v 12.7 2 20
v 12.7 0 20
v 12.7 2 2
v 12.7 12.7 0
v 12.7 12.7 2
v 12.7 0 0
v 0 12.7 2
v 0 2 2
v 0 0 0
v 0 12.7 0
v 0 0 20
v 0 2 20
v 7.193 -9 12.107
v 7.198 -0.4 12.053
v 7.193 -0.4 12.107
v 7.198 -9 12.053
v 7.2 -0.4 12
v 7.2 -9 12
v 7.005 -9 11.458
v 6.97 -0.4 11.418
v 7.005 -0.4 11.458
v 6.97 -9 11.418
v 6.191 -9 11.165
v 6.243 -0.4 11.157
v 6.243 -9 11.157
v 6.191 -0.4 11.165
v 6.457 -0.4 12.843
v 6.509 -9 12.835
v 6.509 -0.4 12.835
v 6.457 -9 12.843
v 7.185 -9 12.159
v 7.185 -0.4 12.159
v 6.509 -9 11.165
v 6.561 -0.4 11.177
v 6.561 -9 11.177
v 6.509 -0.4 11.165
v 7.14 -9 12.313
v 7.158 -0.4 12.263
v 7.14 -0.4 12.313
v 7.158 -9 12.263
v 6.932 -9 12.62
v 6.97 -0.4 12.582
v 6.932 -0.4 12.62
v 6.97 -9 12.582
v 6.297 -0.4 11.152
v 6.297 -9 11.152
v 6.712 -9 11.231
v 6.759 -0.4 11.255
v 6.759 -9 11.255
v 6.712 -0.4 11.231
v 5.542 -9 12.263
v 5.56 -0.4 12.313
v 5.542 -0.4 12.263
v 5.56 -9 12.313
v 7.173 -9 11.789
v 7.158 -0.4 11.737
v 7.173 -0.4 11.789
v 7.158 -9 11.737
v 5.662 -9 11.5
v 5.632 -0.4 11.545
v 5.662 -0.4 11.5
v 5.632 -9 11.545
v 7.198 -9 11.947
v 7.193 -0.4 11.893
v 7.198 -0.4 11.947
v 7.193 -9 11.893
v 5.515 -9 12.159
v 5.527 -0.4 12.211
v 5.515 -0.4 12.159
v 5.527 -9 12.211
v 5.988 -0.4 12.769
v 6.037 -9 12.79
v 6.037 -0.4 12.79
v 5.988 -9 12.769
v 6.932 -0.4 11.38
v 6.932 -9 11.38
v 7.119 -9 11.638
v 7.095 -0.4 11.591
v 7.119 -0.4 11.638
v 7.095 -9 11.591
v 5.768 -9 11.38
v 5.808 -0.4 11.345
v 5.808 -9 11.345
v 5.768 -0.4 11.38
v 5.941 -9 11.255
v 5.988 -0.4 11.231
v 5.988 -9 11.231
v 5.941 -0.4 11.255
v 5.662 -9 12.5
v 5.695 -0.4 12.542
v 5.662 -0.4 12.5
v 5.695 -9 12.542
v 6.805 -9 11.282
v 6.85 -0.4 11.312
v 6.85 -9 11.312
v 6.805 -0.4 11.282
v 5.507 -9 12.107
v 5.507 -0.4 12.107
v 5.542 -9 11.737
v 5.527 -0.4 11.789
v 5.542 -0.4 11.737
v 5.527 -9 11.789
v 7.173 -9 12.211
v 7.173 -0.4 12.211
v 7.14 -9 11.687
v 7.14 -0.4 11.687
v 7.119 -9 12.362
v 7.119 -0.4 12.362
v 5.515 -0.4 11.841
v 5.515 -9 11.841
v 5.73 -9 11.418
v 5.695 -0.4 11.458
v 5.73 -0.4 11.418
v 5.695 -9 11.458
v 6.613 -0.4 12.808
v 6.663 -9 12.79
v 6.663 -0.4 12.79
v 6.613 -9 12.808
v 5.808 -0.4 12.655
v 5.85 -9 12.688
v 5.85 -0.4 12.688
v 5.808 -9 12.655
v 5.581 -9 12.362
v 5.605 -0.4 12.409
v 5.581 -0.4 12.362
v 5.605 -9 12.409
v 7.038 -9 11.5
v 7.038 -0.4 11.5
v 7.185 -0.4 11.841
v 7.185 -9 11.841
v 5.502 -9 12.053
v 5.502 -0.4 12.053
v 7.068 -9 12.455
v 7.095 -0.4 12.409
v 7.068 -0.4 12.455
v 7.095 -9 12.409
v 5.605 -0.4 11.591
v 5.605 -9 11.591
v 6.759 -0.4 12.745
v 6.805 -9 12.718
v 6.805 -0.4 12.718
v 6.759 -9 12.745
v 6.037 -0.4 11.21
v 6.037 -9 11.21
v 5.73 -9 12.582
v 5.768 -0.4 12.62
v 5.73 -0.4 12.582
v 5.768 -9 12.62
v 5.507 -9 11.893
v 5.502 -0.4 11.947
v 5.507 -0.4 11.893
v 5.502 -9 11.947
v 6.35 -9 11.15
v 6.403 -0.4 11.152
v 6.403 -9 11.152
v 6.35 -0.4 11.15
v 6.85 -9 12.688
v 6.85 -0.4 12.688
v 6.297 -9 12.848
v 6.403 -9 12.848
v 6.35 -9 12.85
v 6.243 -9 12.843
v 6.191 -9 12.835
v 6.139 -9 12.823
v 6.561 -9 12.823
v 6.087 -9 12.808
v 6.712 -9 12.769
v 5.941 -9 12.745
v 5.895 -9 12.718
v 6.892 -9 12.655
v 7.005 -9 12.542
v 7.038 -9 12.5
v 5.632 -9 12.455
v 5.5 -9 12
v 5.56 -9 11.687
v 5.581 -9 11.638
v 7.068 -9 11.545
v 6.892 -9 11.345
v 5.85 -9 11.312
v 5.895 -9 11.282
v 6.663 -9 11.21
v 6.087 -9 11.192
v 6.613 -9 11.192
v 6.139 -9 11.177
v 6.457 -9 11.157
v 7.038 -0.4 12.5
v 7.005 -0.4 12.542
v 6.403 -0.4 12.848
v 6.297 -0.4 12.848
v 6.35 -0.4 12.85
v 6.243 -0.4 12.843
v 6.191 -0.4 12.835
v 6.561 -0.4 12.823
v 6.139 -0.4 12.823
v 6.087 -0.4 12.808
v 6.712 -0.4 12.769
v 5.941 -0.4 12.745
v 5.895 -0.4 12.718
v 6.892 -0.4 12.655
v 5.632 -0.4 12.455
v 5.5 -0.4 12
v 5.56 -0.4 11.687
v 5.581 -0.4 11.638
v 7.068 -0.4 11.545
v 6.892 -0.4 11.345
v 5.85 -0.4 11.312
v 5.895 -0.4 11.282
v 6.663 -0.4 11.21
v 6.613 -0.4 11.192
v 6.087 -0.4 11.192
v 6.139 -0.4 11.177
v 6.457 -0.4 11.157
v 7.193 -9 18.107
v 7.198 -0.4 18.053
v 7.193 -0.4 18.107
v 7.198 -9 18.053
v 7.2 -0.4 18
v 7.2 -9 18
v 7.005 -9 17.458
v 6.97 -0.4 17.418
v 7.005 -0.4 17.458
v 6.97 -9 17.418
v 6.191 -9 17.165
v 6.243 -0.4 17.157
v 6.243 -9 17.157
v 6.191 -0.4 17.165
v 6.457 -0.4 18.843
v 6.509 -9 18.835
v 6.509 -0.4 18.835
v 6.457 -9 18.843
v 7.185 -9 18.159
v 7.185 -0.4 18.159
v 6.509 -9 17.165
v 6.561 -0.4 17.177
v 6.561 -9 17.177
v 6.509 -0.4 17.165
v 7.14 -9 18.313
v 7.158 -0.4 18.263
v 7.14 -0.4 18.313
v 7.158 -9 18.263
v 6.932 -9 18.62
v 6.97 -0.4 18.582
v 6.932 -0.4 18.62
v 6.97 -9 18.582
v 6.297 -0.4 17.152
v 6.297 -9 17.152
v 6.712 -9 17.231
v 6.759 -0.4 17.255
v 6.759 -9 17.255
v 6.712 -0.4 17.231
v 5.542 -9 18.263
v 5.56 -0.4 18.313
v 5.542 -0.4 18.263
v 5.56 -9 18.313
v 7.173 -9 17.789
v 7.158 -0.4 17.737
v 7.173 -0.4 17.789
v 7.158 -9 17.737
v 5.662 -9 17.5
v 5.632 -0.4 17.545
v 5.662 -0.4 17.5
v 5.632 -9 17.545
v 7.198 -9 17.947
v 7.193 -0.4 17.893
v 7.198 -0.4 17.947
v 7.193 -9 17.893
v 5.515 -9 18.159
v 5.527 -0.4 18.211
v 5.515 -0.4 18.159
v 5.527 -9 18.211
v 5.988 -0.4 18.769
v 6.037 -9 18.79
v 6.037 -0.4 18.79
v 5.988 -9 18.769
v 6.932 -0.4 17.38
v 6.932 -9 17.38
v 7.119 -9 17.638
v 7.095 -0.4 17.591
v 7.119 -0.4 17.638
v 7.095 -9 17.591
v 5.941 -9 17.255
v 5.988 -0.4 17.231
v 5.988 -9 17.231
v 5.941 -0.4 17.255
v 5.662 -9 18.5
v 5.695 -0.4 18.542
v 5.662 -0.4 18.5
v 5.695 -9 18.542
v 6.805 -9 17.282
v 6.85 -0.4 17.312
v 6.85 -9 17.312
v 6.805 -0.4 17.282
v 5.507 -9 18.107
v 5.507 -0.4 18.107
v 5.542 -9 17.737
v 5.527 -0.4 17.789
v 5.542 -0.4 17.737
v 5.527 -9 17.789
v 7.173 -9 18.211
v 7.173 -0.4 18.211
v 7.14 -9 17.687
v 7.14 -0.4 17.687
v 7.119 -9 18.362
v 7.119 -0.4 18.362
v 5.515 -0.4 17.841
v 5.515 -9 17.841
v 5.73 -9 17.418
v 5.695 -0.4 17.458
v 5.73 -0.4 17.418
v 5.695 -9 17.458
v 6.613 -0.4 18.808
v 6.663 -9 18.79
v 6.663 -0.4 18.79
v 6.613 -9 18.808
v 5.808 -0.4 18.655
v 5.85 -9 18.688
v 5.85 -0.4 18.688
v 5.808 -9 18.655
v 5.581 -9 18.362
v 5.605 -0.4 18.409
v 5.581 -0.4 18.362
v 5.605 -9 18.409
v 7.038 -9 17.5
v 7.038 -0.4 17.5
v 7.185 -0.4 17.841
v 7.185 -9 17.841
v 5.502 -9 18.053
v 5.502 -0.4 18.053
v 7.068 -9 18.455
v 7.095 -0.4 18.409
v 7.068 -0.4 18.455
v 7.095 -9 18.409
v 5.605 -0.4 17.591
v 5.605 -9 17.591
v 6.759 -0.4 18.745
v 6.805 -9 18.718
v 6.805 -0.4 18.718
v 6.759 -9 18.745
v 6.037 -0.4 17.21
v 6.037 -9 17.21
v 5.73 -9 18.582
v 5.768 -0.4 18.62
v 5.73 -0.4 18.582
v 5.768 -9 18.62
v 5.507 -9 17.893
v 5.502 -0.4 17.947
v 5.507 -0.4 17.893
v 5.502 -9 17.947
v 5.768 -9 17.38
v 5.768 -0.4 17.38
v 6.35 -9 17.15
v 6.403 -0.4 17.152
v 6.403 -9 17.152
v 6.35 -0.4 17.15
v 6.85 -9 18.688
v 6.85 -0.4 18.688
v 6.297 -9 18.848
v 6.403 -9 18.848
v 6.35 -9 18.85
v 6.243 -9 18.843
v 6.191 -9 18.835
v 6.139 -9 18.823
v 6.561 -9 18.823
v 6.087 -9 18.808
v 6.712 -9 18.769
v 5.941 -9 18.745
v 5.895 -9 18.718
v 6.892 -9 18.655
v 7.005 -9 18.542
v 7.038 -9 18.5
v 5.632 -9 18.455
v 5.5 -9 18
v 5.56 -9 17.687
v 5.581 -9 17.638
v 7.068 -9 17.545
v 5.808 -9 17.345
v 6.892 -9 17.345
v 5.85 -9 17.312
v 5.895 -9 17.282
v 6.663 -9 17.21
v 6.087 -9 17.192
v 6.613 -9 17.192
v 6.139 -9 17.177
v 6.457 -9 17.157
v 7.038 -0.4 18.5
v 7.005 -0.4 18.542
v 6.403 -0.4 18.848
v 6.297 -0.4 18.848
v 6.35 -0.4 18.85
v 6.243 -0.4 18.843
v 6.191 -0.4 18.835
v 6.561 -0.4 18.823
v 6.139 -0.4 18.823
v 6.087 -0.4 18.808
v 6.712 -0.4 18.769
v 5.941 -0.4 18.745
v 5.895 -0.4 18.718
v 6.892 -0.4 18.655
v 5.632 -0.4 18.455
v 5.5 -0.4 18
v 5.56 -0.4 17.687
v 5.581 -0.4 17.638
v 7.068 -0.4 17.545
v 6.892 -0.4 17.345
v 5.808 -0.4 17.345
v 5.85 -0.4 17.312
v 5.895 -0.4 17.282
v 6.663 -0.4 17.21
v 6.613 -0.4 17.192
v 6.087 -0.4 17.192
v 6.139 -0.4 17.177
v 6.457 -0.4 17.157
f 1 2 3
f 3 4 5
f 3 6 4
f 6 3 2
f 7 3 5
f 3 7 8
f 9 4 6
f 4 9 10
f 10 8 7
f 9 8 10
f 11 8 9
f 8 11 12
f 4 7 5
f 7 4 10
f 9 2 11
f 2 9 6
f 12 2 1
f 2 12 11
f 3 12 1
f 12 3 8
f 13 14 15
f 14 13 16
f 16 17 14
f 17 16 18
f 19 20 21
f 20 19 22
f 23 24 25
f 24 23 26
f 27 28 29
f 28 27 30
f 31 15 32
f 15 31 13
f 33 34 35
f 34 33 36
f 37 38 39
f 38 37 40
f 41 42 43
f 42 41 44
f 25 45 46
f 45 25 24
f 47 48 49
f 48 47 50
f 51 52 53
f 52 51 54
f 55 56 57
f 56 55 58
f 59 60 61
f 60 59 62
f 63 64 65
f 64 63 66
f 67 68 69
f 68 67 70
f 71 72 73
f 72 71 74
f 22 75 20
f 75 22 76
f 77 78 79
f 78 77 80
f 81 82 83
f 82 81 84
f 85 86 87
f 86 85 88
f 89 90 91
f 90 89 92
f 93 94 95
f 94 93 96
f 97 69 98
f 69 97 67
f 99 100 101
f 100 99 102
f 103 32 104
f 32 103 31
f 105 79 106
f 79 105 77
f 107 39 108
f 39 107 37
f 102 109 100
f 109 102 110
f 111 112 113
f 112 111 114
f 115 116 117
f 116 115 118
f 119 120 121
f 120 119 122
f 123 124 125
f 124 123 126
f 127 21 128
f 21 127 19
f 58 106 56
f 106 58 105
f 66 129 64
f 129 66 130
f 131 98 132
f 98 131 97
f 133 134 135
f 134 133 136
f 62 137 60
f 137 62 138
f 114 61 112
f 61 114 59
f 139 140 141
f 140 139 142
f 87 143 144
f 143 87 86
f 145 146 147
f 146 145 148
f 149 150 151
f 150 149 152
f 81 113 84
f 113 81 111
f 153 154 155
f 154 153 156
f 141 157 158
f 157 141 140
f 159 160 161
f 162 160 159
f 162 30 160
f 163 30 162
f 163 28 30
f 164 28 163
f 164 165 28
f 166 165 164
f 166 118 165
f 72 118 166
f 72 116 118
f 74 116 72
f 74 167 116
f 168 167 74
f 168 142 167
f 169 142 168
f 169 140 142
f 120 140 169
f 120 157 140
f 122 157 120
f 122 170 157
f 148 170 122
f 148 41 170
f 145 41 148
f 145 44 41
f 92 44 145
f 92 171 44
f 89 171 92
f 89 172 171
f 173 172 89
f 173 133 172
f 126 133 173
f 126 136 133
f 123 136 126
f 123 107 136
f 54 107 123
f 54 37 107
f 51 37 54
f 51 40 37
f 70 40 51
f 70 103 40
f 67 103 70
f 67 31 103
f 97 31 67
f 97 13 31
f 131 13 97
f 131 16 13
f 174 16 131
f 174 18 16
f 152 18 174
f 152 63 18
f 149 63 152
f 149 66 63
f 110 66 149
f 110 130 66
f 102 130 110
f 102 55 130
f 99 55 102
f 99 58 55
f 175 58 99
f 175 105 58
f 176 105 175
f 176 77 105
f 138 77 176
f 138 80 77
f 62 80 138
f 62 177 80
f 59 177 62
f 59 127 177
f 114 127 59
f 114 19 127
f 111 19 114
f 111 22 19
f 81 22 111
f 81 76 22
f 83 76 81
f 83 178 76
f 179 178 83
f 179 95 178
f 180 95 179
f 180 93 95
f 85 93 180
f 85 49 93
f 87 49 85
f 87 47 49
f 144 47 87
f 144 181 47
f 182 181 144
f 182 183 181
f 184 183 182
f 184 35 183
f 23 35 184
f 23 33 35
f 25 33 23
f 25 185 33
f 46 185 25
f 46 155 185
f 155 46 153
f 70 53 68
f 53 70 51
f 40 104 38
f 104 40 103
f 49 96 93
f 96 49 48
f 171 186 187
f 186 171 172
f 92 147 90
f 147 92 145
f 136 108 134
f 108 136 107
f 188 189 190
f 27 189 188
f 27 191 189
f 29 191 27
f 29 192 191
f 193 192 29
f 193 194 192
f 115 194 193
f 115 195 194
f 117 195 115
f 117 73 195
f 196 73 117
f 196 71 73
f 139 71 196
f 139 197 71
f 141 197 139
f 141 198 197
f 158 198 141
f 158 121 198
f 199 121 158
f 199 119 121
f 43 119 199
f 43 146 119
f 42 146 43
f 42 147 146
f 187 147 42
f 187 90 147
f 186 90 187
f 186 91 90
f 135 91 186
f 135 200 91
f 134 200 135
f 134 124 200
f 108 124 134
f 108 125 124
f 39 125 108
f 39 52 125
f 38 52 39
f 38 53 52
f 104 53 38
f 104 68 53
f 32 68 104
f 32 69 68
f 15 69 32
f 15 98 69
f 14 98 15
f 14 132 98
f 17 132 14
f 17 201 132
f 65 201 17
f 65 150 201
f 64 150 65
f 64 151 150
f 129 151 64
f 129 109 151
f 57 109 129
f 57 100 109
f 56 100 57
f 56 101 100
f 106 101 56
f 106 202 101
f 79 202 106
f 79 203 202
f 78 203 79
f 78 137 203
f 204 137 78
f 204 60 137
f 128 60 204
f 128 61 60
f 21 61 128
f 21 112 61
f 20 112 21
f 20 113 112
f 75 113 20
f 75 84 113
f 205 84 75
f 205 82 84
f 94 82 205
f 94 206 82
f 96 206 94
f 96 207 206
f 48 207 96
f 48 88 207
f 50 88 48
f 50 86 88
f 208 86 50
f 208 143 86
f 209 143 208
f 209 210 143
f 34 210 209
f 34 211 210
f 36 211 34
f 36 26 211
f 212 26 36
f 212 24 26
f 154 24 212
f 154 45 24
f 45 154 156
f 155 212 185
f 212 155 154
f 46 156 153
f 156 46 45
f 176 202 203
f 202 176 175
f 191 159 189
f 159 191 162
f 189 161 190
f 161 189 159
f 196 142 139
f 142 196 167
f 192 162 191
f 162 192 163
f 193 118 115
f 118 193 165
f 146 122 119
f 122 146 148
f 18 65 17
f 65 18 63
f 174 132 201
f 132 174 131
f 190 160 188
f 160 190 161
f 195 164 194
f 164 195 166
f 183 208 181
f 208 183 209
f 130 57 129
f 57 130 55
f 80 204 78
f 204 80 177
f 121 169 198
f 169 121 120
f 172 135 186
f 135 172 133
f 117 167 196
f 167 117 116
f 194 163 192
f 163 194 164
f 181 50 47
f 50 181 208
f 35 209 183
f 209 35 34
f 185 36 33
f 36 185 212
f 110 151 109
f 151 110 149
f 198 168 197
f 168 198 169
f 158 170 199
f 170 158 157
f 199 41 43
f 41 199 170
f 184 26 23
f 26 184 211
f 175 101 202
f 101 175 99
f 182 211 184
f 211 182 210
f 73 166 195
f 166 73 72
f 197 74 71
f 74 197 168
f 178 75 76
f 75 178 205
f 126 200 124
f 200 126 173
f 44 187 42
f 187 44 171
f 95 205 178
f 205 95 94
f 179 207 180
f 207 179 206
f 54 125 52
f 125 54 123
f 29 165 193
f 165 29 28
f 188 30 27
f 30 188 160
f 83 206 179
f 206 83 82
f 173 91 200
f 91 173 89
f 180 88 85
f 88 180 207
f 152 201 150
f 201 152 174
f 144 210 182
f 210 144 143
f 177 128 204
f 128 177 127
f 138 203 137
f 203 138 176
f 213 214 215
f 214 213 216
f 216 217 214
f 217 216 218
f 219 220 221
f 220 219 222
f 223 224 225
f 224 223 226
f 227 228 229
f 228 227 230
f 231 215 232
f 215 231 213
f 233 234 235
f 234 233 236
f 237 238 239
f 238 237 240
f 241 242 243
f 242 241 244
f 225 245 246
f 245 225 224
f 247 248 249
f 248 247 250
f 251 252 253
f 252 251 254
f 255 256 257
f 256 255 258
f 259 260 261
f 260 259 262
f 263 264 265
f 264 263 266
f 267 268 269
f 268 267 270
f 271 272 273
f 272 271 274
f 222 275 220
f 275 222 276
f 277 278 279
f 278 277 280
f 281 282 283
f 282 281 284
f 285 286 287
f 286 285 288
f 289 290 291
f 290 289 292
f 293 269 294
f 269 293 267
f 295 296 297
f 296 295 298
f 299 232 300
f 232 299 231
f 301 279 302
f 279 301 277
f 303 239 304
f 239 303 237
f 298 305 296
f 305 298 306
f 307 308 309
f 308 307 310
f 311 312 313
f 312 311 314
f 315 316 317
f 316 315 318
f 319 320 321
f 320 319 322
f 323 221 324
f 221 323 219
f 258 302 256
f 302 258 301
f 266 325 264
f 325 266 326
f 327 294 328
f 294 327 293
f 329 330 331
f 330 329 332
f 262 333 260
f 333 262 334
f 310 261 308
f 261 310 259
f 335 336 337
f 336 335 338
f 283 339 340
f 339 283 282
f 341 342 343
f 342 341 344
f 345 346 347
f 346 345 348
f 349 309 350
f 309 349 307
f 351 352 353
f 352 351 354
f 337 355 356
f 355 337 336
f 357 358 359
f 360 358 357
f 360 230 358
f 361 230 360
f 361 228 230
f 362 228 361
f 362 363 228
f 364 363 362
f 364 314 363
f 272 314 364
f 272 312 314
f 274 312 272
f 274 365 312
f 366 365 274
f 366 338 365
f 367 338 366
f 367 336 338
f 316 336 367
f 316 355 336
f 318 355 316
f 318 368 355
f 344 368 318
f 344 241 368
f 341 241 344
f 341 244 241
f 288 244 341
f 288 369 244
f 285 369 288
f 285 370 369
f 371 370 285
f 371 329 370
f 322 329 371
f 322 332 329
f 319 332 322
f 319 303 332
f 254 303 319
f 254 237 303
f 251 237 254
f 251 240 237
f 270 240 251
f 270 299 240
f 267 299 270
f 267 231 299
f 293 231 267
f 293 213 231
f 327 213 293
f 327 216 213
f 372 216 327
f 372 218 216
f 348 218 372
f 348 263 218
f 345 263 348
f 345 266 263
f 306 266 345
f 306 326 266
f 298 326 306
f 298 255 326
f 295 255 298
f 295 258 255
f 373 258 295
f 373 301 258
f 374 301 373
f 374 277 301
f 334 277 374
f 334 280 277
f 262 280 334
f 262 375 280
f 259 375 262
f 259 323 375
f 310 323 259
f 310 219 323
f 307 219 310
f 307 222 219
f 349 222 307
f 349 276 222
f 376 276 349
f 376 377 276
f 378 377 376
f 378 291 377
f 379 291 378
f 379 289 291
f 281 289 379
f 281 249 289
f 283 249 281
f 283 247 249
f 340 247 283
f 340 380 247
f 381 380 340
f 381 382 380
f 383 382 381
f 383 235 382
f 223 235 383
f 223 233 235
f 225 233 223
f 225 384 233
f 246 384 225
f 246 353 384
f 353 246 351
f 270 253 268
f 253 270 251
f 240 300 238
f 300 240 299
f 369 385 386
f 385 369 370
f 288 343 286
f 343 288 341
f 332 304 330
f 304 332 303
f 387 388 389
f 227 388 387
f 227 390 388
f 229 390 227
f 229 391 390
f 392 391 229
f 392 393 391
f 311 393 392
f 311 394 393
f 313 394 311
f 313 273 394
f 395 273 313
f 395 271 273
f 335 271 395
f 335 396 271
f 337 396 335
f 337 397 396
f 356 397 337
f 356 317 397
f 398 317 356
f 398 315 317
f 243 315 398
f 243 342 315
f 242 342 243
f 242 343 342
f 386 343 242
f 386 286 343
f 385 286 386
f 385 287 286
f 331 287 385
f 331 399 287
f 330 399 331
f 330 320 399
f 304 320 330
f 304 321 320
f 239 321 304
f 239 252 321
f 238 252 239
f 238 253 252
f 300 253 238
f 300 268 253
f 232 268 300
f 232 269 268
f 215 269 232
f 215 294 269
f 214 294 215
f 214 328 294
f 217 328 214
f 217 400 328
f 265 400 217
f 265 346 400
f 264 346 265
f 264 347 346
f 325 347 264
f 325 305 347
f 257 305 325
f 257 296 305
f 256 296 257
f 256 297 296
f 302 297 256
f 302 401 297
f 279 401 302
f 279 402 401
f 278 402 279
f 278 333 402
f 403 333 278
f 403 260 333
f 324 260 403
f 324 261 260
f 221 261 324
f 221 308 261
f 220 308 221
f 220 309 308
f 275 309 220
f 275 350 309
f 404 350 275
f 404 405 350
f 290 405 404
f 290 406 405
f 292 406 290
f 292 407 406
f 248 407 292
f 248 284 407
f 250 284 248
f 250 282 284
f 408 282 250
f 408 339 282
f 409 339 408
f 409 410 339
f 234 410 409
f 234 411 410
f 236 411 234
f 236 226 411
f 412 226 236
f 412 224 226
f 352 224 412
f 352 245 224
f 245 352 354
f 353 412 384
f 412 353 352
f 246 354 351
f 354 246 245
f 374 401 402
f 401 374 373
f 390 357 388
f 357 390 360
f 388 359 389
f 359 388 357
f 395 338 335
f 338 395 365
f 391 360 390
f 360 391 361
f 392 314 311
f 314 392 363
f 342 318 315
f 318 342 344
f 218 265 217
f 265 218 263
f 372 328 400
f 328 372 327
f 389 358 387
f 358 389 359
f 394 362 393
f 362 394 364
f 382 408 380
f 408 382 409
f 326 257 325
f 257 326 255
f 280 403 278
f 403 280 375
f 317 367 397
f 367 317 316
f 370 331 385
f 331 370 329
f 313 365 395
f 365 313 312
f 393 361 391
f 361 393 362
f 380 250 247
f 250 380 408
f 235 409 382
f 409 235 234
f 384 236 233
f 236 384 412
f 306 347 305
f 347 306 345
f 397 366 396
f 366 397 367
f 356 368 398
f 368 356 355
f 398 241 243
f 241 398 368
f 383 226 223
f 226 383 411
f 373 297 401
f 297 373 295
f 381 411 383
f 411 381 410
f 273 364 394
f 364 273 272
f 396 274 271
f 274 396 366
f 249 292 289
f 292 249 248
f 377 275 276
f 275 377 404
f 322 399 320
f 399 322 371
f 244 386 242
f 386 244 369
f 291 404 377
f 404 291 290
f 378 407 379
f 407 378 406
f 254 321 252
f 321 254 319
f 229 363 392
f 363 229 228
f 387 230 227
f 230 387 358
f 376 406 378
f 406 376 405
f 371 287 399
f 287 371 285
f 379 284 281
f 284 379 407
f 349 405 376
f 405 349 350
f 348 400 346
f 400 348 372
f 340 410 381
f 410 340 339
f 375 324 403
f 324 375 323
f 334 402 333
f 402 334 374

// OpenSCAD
/**
* Plastic insert to snap into the end offset* the
* drawer slide for Ninda's Gym
**/


$fn=100;

hole_dia = 5.25;
hole_edge_from_end = 16.5;
rail_width = 11.5;
rail_width_inner = 6.5;
rail_depth = 6;
rail_thickness = 1.4;

cap_dia = rail_width;

cap_inner_length = hole_edge_from_end + 2*hole_dia;
cap_length = cap_inner_length + cap_dia / 2;

hole_spacing = 14.15 - hole_dia;

module half_circle(dia, thickness) {

difference() {
cylinder(h = thickness, d = dia);

translate([-(dia+1)/2,-dia,-thickness/2])
cube([dia+1, dia, thickness*2]);

}

}


module rail_inner() {
scale([6.5/10.7,1,1])
linear_extrude(height = cap_inner_length)
polygon([
[0,0],
[0,0.7],
[0,1.4],
[0.3,1.5],
[0.6,1.6],
[0.75,1.75],
[0.9,1.9],
[1,2.1],
[1.1,2.3],
[1.1,2.55],
[1.1,2.8],
[1,2.95],
[0.9,3.1],
[0.8,3.3],
[0.8,4.25],
[0.8,5.2],
[1.1,5.6],
[1.4,5.8],
[2,6],
[2.5,6.1],
[3.1,6.1],
[3.4,6],
[4.6,5.4],
[7.2,5.4],
[7.8,5.5],
[8.8,6.1],
[9.05,6.15],
[9.3,6.2],
[9.9,6.2],
[10.1,6.15],
[10.3,6.1],
[10.4,6],
[10.55,5.75],
[10.7,5.5],
[10.6,0.1],
[9.3,0.1],
[9.3,3.78],
[9.25,4.03],
[8.95,4.34],
[8.7,4.4],
[4.6,4.4],
[2.9,4.65],
[2.5,4.7],
[2.2,4.5],
[2.1,3.3],
[2.3,2.9],
[2.3,2.5],
[2.2,1.9],
[1.4,1.2],
[1.4,0.1],
[0.7,0.05],
[0,0]]);

translate([rail_width/2 - 2,rail_depth - rail_thickness - 0.4,cap_inner_length - hole_dia/2 - hole_edge_from_end - 0.5])
rotate([-90,0,0])
cylinder(h=2 * rail_thickness, d=hole_dia - 0.5);

// now stick a half-circle on the top on a square base
translate([ - 2 * rail_thickness,0,cap_inner_length - 0.4]){
cube([rail_width, rail_depth + 3 * rail_thickness, rail_thickness]);

translate([0,rail_depth + rail_thickness+0.5,-2 * rail_thickness+0.4])
cube([rail_width, rail_thickness*1.5,rail_thickness*2]);
}

translate([3 ,rail_depth,cap_inner_length+rail_thickness-0.4])
rotate([90,0,0])
half_circle(rail_width, rail_thickness);
}

module end_stop() {
// three snap-ins with a rod sticking out

cylinder(h=3 * rail_thickness, d = hole_dia);
translate([hole_spacing,0,0])
cylinder(h=3 * rail_thickness, d = hole_dia);
translate([2 * hole_spacing,0,0])
cylinder(h=3 * rail_thickness, d = hole_dia);

translate([-hole_spacing/2,-0.75 * hole_dia,0])
cube([3 * hole_spacing, 1.5 * hole_dia, rail_thickness]);

// sticky-out bit
translate([2 * hole_spacing - hole_dia/2,-0.75 * hole_dia,0])
cube([5,30,rail_thickness]);

translate([2 * hole_spacing - hole_dia/2 + 1,16,0])
cube([3,10,10 *rail_thickness]);
}

module microswitch_mount() {
w = 12.7;
d = 5.6;
h = 6.5;
terminal_length = 6;
mount_to_roller = 20;
hole_dia = 2;
hole_spacing = 6;
// Flat base which can be glued on
cube([w,w,2]);
//side panel with sticky out bits to snap the switch on to
cube([w,2,20]);
//sticky out bit

translate([w/2,-0.4,12])
rotate([90,0,0])
cylinder(h=d + 3, d=hole_dia - 0.3);

translate([w/2, -0.4, 12 + hole_spacing])
rotate([90,0,0])
cylinder(h=d + 3, d=hole_dia - 0.3);
}


microswitch_mount();

//rail_inner();

//translate([20,0,0])end_stop();

//half_circle(rail_width, rail_thickness);
